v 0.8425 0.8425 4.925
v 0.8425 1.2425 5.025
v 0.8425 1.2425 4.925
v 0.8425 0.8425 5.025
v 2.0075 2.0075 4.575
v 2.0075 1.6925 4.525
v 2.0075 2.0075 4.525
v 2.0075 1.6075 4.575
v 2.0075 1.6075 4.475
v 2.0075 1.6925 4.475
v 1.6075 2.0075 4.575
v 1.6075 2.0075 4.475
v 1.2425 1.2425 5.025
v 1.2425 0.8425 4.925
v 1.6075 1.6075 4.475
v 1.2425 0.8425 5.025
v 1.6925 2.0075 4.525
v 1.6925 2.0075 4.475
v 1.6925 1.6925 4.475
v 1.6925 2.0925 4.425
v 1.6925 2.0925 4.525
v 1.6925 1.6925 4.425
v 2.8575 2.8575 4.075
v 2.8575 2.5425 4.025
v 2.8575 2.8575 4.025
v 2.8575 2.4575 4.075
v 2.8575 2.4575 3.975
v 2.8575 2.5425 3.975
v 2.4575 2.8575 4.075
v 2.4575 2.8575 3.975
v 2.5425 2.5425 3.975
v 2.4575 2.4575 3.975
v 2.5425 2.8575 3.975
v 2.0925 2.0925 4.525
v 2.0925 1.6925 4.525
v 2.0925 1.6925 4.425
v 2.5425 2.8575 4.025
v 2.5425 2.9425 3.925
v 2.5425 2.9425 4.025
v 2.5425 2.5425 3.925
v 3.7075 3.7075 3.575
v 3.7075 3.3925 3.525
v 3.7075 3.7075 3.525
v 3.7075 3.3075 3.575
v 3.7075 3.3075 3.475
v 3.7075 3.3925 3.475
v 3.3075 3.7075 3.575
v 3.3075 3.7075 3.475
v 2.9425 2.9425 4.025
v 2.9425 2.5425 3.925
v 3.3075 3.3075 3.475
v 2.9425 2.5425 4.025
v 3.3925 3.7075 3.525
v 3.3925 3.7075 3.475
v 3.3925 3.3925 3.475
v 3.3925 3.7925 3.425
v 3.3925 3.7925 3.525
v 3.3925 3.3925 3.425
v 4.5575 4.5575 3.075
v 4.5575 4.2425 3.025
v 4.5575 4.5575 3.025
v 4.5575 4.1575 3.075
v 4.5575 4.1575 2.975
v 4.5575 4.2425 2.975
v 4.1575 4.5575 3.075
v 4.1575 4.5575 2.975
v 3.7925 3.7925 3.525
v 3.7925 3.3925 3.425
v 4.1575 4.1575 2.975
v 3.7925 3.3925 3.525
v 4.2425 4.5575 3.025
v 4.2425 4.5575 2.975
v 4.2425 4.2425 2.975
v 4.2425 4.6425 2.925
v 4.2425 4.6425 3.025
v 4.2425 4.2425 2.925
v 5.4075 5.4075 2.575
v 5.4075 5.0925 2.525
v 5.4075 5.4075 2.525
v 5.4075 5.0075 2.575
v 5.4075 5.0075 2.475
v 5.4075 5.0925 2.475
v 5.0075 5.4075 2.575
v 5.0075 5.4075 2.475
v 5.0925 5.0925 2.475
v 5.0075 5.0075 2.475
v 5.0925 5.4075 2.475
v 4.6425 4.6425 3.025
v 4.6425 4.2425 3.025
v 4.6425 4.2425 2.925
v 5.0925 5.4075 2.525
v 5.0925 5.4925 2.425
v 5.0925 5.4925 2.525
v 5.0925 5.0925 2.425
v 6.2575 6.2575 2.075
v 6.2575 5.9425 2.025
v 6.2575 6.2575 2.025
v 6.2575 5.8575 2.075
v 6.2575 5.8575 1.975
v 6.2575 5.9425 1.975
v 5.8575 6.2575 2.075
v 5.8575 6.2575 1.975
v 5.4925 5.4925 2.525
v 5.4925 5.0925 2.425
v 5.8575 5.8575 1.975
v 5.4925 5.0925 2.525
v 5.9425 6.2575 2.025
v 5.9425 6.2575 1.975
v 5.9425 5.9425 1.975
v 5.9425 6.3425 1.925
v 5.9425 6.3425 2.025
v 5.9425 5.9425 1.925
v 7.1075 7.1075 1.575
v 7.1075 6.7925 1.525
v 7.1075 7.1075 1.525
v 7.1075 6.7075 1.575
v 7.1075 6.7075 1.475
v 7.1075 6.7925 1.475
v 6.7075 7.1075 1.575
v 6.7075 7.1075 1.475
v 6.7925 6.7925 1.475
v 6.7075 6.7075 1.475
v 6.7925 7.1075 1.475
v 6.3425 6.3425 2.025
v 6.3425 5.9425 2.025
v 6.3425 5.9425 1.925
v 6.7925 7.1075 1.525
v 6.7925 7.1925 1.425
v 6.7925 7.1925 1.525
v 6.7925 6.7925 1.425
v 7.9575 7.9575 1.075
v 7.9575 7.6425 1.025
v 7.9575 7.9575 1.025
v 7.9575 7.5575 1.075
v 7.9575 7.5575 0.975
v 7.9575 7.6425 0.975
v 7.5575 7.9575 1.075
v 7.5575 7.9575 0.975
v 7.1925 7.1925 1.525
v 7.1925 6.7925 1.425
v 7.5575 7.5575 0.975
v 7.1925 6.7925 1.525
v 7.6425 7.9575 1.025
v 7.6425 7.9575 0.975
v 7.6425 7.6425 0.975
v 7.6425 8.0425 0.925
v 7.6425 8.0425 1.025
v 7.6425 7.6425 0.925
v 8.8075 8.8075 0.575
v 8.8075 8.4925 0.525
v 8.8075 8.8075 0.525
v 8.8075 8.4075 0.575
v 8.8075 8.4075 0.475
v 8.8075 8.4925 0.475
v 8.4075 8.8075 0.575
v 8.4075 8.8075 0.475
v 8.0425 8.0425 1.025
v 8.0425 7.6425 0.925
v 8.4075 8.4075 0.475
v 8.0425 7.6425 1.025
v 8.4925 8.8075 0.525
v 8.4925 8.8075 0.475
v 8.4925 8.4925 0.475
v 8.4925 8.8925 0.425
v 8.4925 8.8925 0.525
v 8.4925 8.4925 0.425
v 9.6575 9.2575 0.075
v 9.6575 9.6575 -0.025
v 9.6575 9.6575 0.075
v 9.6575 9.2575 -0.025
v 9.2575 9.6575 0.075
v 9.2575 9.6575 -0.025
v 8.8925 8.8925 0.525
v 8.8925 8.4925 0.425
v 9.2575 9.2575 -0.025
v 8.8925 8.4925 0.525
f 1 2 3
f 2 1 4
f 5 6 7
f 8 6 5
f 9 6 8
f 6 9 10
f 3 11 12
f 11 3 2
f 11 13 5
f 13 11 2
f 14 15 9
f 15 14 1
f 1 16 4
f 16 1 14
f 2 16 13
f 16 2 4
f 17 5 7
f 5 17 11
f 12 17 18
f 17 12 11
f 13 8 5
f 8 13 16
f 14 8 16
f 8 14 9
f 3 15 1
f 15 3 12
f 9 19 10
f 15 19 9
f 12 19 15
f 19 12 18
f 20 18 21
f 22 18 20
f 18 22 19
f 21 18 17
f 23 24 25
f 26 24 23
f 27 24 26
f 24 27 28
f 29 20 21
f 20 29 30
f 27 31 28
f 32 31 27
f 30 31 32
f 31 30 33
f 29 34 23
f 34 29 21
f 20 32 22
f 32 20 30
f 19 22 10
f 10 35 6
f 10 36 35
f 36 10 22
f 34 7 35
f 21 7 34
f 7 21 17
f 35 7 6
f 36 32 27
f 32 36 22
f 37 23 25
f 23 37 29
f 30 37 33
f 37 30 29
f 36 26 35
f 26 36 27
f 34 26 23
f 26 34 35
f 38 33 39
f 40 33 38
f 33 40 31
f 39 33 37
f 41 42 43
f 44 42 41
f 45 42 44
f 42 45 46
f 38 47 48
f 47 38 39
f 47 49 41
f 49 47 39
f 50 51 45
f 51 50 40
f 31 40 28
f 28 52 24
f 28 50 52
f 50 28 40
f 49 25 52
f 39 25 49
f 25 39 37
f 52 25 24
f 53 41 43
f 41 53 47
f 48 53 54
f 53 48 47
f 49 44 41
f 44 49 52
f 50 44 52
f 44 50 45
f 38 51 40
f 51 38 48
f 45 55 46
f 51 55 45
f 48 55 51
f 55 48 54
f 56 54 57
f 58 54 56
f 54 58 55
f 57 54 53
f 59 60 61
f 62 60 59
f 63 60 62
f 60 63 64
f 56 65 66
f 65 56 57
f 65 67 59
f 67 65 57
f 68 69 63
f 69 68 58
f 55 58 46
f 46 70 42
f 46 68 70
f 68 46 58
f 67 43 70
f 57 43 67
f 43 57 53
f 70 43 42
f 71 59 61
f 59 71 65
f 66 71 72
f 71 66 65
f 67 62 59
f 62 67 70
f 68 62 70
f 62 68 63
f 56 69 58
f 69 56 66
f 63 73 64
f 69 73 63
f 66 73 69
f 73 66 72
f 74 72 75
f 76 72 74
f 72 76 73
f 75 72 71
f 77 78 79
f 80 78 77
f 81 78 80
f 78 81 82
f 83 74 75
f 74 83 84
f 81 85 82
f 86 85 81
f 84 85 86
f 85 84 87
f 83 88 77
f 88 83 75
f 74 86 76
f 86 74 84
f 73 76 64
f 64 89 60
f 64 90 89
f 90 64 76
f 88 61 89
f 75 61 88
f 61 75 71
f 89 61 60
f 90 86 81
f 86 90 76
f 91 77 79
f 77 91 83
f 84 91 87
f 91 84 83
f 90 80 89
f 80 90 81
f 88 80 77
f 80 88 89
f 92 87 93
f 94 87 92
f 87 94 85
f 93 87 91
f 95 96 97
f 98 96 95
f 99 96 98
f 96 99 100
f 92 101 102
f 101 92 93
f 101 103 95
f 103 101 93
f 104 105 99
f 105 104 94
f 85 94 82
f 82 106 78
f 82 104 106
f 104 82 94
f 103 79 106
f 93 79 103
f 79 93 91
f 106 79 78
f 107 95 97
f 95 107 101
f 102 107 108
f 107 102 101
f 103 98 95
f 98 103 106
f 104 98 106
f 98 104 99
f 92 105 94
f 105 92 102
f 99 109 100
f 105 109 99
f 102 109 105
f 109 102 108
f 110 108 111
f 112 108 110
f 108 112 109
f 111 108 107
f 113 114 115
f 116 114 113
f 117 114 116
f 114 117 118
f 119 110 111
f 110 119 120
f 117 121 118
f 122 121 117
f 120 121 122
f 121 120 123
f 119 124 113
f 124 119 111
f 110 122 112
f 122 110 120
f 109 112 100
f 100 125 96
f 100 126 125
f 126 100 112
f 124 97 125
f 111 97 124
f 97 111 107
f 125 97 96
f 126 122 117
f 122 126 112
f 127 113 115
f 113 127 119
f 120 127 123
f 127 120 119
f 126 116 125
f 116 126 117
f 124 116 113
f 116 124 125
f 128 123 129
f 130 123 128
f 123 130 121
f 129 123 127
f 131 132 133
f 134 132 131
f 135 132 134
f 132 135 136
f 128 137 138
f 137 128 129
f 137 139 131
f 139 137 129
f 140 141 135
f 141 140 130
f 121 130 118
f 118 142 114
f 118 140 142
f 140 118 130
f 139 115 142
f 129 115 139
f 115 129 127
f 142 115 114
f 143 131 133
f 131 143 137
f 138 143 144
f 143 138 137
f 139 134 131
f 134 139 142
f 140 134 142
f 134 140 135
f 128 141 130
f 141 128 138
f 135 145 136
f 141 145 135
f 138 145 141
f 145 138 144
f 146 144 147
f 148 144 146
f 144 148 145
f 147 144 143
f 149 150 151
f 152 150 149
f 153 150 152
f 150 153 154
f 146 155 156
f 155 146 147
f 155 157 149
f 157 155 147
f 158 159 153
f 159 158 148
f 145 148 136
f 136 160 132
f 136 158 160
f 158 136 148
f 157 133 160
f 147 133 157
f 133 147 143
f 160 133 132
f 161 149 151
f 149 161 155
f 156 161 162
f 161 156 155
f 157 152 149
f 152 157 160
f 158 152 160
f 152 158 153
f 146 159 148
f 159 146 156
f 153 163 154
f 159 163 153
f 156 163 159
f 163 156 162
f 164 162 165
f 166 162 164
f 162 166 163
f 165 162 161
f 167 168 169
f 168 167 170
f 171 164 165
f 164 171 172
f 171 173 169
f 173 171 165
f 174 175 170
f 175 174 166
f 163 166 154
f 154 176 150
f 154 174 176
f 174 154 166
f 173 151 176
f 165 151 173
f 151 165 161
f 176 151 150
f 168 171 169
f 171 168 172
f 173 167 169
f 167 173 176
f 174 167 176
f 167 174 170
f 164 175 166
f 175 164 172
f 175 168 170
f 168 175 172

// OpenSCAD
hull() {
    translate([1.0425, 1.0425, 4.975]) cube([0.4, 0.4, 0.1], center=true);
    translate([1.8075, 1.8075, 4.5249999999999995]) cube([0.4, 0.4, 0.1], center=true);
}


hull() {
    translate([1.8925, 1.8925, 4.475]) cube([0.4, 0.4, 0.1], center=true);
    translate([2.6575, 2.6575, 4.025]) cube([0.4, 0.4, 0.1], center=true);
}


hull() {
    translate([2.7425, 2.7425, 3.975]) cube([0.4, 0.4, 0.1], center=true);
    translate([3.5075, 3.5075, 3.525]) cube([0.4, 0.4, 0.1], center=true);
}


hull() {
    translate([3.5925, 3.5925, 3.475]) cube([0.4, 0.4, 0.1], center=true);
    translate([4.357500000000001, 4.357500000000001, 3.0250000000000004]) cube([0.4, 0.4, 0.1], center=true);
}


hull() {
    translate([4.442500000000001, 4.442500000000001, 2.975]) cube([0.4, 0.4, 0.1], center=true);
    translate([5.2075000000000005, 5.2075000000000005, 2.525]) cube([0.4, 0.4, 0.1], center=true);
}


hull() {
    translate([5.2925, 5.2925, 2.475]) cube([0.4, 0.4, 0.1], center=true);
    translate([6.0575, 6.0575, 2.025]) cube([0.4, 0.4, 0.1], center=true);
}


hull() {
    translate([6.1425, 6.1425, 1.975]) cube([0.4, 0.4, 0.1], center=true);
    translate([6.9075, 6.9075, 1.5250000000000001]) cube([0.4, 0.4, 0.1], center=true);
}


hull() {
    translate([6.9925, 6.9925, 1.475]) cube([0.4, 0.4, 0.1], center=true);
    translate([7.757499999999999, 7.757499999999999, 1.025]) cube([0.4, 0.4, 0.1], center=true);
}


hull() {
    translate([7.842499999999999, 7.842499999999999, 0.9750000000000001]) cube([0.4, 0.4, 0.1], center=true);
    translate([8.6075, 8.6075, 0.525]) cube([0.4, 0.4, 0.1], center=true);
}


hull() {
    translate([8.6925, 8.6925, 0.47500000000000003]) cube([0.4, 0.4, 0.1], center=true);
    translate([9.457500000000001, 9.457500000000001, 0.025]) cube([0.4, 0.4, 0.1], center=true);
}
